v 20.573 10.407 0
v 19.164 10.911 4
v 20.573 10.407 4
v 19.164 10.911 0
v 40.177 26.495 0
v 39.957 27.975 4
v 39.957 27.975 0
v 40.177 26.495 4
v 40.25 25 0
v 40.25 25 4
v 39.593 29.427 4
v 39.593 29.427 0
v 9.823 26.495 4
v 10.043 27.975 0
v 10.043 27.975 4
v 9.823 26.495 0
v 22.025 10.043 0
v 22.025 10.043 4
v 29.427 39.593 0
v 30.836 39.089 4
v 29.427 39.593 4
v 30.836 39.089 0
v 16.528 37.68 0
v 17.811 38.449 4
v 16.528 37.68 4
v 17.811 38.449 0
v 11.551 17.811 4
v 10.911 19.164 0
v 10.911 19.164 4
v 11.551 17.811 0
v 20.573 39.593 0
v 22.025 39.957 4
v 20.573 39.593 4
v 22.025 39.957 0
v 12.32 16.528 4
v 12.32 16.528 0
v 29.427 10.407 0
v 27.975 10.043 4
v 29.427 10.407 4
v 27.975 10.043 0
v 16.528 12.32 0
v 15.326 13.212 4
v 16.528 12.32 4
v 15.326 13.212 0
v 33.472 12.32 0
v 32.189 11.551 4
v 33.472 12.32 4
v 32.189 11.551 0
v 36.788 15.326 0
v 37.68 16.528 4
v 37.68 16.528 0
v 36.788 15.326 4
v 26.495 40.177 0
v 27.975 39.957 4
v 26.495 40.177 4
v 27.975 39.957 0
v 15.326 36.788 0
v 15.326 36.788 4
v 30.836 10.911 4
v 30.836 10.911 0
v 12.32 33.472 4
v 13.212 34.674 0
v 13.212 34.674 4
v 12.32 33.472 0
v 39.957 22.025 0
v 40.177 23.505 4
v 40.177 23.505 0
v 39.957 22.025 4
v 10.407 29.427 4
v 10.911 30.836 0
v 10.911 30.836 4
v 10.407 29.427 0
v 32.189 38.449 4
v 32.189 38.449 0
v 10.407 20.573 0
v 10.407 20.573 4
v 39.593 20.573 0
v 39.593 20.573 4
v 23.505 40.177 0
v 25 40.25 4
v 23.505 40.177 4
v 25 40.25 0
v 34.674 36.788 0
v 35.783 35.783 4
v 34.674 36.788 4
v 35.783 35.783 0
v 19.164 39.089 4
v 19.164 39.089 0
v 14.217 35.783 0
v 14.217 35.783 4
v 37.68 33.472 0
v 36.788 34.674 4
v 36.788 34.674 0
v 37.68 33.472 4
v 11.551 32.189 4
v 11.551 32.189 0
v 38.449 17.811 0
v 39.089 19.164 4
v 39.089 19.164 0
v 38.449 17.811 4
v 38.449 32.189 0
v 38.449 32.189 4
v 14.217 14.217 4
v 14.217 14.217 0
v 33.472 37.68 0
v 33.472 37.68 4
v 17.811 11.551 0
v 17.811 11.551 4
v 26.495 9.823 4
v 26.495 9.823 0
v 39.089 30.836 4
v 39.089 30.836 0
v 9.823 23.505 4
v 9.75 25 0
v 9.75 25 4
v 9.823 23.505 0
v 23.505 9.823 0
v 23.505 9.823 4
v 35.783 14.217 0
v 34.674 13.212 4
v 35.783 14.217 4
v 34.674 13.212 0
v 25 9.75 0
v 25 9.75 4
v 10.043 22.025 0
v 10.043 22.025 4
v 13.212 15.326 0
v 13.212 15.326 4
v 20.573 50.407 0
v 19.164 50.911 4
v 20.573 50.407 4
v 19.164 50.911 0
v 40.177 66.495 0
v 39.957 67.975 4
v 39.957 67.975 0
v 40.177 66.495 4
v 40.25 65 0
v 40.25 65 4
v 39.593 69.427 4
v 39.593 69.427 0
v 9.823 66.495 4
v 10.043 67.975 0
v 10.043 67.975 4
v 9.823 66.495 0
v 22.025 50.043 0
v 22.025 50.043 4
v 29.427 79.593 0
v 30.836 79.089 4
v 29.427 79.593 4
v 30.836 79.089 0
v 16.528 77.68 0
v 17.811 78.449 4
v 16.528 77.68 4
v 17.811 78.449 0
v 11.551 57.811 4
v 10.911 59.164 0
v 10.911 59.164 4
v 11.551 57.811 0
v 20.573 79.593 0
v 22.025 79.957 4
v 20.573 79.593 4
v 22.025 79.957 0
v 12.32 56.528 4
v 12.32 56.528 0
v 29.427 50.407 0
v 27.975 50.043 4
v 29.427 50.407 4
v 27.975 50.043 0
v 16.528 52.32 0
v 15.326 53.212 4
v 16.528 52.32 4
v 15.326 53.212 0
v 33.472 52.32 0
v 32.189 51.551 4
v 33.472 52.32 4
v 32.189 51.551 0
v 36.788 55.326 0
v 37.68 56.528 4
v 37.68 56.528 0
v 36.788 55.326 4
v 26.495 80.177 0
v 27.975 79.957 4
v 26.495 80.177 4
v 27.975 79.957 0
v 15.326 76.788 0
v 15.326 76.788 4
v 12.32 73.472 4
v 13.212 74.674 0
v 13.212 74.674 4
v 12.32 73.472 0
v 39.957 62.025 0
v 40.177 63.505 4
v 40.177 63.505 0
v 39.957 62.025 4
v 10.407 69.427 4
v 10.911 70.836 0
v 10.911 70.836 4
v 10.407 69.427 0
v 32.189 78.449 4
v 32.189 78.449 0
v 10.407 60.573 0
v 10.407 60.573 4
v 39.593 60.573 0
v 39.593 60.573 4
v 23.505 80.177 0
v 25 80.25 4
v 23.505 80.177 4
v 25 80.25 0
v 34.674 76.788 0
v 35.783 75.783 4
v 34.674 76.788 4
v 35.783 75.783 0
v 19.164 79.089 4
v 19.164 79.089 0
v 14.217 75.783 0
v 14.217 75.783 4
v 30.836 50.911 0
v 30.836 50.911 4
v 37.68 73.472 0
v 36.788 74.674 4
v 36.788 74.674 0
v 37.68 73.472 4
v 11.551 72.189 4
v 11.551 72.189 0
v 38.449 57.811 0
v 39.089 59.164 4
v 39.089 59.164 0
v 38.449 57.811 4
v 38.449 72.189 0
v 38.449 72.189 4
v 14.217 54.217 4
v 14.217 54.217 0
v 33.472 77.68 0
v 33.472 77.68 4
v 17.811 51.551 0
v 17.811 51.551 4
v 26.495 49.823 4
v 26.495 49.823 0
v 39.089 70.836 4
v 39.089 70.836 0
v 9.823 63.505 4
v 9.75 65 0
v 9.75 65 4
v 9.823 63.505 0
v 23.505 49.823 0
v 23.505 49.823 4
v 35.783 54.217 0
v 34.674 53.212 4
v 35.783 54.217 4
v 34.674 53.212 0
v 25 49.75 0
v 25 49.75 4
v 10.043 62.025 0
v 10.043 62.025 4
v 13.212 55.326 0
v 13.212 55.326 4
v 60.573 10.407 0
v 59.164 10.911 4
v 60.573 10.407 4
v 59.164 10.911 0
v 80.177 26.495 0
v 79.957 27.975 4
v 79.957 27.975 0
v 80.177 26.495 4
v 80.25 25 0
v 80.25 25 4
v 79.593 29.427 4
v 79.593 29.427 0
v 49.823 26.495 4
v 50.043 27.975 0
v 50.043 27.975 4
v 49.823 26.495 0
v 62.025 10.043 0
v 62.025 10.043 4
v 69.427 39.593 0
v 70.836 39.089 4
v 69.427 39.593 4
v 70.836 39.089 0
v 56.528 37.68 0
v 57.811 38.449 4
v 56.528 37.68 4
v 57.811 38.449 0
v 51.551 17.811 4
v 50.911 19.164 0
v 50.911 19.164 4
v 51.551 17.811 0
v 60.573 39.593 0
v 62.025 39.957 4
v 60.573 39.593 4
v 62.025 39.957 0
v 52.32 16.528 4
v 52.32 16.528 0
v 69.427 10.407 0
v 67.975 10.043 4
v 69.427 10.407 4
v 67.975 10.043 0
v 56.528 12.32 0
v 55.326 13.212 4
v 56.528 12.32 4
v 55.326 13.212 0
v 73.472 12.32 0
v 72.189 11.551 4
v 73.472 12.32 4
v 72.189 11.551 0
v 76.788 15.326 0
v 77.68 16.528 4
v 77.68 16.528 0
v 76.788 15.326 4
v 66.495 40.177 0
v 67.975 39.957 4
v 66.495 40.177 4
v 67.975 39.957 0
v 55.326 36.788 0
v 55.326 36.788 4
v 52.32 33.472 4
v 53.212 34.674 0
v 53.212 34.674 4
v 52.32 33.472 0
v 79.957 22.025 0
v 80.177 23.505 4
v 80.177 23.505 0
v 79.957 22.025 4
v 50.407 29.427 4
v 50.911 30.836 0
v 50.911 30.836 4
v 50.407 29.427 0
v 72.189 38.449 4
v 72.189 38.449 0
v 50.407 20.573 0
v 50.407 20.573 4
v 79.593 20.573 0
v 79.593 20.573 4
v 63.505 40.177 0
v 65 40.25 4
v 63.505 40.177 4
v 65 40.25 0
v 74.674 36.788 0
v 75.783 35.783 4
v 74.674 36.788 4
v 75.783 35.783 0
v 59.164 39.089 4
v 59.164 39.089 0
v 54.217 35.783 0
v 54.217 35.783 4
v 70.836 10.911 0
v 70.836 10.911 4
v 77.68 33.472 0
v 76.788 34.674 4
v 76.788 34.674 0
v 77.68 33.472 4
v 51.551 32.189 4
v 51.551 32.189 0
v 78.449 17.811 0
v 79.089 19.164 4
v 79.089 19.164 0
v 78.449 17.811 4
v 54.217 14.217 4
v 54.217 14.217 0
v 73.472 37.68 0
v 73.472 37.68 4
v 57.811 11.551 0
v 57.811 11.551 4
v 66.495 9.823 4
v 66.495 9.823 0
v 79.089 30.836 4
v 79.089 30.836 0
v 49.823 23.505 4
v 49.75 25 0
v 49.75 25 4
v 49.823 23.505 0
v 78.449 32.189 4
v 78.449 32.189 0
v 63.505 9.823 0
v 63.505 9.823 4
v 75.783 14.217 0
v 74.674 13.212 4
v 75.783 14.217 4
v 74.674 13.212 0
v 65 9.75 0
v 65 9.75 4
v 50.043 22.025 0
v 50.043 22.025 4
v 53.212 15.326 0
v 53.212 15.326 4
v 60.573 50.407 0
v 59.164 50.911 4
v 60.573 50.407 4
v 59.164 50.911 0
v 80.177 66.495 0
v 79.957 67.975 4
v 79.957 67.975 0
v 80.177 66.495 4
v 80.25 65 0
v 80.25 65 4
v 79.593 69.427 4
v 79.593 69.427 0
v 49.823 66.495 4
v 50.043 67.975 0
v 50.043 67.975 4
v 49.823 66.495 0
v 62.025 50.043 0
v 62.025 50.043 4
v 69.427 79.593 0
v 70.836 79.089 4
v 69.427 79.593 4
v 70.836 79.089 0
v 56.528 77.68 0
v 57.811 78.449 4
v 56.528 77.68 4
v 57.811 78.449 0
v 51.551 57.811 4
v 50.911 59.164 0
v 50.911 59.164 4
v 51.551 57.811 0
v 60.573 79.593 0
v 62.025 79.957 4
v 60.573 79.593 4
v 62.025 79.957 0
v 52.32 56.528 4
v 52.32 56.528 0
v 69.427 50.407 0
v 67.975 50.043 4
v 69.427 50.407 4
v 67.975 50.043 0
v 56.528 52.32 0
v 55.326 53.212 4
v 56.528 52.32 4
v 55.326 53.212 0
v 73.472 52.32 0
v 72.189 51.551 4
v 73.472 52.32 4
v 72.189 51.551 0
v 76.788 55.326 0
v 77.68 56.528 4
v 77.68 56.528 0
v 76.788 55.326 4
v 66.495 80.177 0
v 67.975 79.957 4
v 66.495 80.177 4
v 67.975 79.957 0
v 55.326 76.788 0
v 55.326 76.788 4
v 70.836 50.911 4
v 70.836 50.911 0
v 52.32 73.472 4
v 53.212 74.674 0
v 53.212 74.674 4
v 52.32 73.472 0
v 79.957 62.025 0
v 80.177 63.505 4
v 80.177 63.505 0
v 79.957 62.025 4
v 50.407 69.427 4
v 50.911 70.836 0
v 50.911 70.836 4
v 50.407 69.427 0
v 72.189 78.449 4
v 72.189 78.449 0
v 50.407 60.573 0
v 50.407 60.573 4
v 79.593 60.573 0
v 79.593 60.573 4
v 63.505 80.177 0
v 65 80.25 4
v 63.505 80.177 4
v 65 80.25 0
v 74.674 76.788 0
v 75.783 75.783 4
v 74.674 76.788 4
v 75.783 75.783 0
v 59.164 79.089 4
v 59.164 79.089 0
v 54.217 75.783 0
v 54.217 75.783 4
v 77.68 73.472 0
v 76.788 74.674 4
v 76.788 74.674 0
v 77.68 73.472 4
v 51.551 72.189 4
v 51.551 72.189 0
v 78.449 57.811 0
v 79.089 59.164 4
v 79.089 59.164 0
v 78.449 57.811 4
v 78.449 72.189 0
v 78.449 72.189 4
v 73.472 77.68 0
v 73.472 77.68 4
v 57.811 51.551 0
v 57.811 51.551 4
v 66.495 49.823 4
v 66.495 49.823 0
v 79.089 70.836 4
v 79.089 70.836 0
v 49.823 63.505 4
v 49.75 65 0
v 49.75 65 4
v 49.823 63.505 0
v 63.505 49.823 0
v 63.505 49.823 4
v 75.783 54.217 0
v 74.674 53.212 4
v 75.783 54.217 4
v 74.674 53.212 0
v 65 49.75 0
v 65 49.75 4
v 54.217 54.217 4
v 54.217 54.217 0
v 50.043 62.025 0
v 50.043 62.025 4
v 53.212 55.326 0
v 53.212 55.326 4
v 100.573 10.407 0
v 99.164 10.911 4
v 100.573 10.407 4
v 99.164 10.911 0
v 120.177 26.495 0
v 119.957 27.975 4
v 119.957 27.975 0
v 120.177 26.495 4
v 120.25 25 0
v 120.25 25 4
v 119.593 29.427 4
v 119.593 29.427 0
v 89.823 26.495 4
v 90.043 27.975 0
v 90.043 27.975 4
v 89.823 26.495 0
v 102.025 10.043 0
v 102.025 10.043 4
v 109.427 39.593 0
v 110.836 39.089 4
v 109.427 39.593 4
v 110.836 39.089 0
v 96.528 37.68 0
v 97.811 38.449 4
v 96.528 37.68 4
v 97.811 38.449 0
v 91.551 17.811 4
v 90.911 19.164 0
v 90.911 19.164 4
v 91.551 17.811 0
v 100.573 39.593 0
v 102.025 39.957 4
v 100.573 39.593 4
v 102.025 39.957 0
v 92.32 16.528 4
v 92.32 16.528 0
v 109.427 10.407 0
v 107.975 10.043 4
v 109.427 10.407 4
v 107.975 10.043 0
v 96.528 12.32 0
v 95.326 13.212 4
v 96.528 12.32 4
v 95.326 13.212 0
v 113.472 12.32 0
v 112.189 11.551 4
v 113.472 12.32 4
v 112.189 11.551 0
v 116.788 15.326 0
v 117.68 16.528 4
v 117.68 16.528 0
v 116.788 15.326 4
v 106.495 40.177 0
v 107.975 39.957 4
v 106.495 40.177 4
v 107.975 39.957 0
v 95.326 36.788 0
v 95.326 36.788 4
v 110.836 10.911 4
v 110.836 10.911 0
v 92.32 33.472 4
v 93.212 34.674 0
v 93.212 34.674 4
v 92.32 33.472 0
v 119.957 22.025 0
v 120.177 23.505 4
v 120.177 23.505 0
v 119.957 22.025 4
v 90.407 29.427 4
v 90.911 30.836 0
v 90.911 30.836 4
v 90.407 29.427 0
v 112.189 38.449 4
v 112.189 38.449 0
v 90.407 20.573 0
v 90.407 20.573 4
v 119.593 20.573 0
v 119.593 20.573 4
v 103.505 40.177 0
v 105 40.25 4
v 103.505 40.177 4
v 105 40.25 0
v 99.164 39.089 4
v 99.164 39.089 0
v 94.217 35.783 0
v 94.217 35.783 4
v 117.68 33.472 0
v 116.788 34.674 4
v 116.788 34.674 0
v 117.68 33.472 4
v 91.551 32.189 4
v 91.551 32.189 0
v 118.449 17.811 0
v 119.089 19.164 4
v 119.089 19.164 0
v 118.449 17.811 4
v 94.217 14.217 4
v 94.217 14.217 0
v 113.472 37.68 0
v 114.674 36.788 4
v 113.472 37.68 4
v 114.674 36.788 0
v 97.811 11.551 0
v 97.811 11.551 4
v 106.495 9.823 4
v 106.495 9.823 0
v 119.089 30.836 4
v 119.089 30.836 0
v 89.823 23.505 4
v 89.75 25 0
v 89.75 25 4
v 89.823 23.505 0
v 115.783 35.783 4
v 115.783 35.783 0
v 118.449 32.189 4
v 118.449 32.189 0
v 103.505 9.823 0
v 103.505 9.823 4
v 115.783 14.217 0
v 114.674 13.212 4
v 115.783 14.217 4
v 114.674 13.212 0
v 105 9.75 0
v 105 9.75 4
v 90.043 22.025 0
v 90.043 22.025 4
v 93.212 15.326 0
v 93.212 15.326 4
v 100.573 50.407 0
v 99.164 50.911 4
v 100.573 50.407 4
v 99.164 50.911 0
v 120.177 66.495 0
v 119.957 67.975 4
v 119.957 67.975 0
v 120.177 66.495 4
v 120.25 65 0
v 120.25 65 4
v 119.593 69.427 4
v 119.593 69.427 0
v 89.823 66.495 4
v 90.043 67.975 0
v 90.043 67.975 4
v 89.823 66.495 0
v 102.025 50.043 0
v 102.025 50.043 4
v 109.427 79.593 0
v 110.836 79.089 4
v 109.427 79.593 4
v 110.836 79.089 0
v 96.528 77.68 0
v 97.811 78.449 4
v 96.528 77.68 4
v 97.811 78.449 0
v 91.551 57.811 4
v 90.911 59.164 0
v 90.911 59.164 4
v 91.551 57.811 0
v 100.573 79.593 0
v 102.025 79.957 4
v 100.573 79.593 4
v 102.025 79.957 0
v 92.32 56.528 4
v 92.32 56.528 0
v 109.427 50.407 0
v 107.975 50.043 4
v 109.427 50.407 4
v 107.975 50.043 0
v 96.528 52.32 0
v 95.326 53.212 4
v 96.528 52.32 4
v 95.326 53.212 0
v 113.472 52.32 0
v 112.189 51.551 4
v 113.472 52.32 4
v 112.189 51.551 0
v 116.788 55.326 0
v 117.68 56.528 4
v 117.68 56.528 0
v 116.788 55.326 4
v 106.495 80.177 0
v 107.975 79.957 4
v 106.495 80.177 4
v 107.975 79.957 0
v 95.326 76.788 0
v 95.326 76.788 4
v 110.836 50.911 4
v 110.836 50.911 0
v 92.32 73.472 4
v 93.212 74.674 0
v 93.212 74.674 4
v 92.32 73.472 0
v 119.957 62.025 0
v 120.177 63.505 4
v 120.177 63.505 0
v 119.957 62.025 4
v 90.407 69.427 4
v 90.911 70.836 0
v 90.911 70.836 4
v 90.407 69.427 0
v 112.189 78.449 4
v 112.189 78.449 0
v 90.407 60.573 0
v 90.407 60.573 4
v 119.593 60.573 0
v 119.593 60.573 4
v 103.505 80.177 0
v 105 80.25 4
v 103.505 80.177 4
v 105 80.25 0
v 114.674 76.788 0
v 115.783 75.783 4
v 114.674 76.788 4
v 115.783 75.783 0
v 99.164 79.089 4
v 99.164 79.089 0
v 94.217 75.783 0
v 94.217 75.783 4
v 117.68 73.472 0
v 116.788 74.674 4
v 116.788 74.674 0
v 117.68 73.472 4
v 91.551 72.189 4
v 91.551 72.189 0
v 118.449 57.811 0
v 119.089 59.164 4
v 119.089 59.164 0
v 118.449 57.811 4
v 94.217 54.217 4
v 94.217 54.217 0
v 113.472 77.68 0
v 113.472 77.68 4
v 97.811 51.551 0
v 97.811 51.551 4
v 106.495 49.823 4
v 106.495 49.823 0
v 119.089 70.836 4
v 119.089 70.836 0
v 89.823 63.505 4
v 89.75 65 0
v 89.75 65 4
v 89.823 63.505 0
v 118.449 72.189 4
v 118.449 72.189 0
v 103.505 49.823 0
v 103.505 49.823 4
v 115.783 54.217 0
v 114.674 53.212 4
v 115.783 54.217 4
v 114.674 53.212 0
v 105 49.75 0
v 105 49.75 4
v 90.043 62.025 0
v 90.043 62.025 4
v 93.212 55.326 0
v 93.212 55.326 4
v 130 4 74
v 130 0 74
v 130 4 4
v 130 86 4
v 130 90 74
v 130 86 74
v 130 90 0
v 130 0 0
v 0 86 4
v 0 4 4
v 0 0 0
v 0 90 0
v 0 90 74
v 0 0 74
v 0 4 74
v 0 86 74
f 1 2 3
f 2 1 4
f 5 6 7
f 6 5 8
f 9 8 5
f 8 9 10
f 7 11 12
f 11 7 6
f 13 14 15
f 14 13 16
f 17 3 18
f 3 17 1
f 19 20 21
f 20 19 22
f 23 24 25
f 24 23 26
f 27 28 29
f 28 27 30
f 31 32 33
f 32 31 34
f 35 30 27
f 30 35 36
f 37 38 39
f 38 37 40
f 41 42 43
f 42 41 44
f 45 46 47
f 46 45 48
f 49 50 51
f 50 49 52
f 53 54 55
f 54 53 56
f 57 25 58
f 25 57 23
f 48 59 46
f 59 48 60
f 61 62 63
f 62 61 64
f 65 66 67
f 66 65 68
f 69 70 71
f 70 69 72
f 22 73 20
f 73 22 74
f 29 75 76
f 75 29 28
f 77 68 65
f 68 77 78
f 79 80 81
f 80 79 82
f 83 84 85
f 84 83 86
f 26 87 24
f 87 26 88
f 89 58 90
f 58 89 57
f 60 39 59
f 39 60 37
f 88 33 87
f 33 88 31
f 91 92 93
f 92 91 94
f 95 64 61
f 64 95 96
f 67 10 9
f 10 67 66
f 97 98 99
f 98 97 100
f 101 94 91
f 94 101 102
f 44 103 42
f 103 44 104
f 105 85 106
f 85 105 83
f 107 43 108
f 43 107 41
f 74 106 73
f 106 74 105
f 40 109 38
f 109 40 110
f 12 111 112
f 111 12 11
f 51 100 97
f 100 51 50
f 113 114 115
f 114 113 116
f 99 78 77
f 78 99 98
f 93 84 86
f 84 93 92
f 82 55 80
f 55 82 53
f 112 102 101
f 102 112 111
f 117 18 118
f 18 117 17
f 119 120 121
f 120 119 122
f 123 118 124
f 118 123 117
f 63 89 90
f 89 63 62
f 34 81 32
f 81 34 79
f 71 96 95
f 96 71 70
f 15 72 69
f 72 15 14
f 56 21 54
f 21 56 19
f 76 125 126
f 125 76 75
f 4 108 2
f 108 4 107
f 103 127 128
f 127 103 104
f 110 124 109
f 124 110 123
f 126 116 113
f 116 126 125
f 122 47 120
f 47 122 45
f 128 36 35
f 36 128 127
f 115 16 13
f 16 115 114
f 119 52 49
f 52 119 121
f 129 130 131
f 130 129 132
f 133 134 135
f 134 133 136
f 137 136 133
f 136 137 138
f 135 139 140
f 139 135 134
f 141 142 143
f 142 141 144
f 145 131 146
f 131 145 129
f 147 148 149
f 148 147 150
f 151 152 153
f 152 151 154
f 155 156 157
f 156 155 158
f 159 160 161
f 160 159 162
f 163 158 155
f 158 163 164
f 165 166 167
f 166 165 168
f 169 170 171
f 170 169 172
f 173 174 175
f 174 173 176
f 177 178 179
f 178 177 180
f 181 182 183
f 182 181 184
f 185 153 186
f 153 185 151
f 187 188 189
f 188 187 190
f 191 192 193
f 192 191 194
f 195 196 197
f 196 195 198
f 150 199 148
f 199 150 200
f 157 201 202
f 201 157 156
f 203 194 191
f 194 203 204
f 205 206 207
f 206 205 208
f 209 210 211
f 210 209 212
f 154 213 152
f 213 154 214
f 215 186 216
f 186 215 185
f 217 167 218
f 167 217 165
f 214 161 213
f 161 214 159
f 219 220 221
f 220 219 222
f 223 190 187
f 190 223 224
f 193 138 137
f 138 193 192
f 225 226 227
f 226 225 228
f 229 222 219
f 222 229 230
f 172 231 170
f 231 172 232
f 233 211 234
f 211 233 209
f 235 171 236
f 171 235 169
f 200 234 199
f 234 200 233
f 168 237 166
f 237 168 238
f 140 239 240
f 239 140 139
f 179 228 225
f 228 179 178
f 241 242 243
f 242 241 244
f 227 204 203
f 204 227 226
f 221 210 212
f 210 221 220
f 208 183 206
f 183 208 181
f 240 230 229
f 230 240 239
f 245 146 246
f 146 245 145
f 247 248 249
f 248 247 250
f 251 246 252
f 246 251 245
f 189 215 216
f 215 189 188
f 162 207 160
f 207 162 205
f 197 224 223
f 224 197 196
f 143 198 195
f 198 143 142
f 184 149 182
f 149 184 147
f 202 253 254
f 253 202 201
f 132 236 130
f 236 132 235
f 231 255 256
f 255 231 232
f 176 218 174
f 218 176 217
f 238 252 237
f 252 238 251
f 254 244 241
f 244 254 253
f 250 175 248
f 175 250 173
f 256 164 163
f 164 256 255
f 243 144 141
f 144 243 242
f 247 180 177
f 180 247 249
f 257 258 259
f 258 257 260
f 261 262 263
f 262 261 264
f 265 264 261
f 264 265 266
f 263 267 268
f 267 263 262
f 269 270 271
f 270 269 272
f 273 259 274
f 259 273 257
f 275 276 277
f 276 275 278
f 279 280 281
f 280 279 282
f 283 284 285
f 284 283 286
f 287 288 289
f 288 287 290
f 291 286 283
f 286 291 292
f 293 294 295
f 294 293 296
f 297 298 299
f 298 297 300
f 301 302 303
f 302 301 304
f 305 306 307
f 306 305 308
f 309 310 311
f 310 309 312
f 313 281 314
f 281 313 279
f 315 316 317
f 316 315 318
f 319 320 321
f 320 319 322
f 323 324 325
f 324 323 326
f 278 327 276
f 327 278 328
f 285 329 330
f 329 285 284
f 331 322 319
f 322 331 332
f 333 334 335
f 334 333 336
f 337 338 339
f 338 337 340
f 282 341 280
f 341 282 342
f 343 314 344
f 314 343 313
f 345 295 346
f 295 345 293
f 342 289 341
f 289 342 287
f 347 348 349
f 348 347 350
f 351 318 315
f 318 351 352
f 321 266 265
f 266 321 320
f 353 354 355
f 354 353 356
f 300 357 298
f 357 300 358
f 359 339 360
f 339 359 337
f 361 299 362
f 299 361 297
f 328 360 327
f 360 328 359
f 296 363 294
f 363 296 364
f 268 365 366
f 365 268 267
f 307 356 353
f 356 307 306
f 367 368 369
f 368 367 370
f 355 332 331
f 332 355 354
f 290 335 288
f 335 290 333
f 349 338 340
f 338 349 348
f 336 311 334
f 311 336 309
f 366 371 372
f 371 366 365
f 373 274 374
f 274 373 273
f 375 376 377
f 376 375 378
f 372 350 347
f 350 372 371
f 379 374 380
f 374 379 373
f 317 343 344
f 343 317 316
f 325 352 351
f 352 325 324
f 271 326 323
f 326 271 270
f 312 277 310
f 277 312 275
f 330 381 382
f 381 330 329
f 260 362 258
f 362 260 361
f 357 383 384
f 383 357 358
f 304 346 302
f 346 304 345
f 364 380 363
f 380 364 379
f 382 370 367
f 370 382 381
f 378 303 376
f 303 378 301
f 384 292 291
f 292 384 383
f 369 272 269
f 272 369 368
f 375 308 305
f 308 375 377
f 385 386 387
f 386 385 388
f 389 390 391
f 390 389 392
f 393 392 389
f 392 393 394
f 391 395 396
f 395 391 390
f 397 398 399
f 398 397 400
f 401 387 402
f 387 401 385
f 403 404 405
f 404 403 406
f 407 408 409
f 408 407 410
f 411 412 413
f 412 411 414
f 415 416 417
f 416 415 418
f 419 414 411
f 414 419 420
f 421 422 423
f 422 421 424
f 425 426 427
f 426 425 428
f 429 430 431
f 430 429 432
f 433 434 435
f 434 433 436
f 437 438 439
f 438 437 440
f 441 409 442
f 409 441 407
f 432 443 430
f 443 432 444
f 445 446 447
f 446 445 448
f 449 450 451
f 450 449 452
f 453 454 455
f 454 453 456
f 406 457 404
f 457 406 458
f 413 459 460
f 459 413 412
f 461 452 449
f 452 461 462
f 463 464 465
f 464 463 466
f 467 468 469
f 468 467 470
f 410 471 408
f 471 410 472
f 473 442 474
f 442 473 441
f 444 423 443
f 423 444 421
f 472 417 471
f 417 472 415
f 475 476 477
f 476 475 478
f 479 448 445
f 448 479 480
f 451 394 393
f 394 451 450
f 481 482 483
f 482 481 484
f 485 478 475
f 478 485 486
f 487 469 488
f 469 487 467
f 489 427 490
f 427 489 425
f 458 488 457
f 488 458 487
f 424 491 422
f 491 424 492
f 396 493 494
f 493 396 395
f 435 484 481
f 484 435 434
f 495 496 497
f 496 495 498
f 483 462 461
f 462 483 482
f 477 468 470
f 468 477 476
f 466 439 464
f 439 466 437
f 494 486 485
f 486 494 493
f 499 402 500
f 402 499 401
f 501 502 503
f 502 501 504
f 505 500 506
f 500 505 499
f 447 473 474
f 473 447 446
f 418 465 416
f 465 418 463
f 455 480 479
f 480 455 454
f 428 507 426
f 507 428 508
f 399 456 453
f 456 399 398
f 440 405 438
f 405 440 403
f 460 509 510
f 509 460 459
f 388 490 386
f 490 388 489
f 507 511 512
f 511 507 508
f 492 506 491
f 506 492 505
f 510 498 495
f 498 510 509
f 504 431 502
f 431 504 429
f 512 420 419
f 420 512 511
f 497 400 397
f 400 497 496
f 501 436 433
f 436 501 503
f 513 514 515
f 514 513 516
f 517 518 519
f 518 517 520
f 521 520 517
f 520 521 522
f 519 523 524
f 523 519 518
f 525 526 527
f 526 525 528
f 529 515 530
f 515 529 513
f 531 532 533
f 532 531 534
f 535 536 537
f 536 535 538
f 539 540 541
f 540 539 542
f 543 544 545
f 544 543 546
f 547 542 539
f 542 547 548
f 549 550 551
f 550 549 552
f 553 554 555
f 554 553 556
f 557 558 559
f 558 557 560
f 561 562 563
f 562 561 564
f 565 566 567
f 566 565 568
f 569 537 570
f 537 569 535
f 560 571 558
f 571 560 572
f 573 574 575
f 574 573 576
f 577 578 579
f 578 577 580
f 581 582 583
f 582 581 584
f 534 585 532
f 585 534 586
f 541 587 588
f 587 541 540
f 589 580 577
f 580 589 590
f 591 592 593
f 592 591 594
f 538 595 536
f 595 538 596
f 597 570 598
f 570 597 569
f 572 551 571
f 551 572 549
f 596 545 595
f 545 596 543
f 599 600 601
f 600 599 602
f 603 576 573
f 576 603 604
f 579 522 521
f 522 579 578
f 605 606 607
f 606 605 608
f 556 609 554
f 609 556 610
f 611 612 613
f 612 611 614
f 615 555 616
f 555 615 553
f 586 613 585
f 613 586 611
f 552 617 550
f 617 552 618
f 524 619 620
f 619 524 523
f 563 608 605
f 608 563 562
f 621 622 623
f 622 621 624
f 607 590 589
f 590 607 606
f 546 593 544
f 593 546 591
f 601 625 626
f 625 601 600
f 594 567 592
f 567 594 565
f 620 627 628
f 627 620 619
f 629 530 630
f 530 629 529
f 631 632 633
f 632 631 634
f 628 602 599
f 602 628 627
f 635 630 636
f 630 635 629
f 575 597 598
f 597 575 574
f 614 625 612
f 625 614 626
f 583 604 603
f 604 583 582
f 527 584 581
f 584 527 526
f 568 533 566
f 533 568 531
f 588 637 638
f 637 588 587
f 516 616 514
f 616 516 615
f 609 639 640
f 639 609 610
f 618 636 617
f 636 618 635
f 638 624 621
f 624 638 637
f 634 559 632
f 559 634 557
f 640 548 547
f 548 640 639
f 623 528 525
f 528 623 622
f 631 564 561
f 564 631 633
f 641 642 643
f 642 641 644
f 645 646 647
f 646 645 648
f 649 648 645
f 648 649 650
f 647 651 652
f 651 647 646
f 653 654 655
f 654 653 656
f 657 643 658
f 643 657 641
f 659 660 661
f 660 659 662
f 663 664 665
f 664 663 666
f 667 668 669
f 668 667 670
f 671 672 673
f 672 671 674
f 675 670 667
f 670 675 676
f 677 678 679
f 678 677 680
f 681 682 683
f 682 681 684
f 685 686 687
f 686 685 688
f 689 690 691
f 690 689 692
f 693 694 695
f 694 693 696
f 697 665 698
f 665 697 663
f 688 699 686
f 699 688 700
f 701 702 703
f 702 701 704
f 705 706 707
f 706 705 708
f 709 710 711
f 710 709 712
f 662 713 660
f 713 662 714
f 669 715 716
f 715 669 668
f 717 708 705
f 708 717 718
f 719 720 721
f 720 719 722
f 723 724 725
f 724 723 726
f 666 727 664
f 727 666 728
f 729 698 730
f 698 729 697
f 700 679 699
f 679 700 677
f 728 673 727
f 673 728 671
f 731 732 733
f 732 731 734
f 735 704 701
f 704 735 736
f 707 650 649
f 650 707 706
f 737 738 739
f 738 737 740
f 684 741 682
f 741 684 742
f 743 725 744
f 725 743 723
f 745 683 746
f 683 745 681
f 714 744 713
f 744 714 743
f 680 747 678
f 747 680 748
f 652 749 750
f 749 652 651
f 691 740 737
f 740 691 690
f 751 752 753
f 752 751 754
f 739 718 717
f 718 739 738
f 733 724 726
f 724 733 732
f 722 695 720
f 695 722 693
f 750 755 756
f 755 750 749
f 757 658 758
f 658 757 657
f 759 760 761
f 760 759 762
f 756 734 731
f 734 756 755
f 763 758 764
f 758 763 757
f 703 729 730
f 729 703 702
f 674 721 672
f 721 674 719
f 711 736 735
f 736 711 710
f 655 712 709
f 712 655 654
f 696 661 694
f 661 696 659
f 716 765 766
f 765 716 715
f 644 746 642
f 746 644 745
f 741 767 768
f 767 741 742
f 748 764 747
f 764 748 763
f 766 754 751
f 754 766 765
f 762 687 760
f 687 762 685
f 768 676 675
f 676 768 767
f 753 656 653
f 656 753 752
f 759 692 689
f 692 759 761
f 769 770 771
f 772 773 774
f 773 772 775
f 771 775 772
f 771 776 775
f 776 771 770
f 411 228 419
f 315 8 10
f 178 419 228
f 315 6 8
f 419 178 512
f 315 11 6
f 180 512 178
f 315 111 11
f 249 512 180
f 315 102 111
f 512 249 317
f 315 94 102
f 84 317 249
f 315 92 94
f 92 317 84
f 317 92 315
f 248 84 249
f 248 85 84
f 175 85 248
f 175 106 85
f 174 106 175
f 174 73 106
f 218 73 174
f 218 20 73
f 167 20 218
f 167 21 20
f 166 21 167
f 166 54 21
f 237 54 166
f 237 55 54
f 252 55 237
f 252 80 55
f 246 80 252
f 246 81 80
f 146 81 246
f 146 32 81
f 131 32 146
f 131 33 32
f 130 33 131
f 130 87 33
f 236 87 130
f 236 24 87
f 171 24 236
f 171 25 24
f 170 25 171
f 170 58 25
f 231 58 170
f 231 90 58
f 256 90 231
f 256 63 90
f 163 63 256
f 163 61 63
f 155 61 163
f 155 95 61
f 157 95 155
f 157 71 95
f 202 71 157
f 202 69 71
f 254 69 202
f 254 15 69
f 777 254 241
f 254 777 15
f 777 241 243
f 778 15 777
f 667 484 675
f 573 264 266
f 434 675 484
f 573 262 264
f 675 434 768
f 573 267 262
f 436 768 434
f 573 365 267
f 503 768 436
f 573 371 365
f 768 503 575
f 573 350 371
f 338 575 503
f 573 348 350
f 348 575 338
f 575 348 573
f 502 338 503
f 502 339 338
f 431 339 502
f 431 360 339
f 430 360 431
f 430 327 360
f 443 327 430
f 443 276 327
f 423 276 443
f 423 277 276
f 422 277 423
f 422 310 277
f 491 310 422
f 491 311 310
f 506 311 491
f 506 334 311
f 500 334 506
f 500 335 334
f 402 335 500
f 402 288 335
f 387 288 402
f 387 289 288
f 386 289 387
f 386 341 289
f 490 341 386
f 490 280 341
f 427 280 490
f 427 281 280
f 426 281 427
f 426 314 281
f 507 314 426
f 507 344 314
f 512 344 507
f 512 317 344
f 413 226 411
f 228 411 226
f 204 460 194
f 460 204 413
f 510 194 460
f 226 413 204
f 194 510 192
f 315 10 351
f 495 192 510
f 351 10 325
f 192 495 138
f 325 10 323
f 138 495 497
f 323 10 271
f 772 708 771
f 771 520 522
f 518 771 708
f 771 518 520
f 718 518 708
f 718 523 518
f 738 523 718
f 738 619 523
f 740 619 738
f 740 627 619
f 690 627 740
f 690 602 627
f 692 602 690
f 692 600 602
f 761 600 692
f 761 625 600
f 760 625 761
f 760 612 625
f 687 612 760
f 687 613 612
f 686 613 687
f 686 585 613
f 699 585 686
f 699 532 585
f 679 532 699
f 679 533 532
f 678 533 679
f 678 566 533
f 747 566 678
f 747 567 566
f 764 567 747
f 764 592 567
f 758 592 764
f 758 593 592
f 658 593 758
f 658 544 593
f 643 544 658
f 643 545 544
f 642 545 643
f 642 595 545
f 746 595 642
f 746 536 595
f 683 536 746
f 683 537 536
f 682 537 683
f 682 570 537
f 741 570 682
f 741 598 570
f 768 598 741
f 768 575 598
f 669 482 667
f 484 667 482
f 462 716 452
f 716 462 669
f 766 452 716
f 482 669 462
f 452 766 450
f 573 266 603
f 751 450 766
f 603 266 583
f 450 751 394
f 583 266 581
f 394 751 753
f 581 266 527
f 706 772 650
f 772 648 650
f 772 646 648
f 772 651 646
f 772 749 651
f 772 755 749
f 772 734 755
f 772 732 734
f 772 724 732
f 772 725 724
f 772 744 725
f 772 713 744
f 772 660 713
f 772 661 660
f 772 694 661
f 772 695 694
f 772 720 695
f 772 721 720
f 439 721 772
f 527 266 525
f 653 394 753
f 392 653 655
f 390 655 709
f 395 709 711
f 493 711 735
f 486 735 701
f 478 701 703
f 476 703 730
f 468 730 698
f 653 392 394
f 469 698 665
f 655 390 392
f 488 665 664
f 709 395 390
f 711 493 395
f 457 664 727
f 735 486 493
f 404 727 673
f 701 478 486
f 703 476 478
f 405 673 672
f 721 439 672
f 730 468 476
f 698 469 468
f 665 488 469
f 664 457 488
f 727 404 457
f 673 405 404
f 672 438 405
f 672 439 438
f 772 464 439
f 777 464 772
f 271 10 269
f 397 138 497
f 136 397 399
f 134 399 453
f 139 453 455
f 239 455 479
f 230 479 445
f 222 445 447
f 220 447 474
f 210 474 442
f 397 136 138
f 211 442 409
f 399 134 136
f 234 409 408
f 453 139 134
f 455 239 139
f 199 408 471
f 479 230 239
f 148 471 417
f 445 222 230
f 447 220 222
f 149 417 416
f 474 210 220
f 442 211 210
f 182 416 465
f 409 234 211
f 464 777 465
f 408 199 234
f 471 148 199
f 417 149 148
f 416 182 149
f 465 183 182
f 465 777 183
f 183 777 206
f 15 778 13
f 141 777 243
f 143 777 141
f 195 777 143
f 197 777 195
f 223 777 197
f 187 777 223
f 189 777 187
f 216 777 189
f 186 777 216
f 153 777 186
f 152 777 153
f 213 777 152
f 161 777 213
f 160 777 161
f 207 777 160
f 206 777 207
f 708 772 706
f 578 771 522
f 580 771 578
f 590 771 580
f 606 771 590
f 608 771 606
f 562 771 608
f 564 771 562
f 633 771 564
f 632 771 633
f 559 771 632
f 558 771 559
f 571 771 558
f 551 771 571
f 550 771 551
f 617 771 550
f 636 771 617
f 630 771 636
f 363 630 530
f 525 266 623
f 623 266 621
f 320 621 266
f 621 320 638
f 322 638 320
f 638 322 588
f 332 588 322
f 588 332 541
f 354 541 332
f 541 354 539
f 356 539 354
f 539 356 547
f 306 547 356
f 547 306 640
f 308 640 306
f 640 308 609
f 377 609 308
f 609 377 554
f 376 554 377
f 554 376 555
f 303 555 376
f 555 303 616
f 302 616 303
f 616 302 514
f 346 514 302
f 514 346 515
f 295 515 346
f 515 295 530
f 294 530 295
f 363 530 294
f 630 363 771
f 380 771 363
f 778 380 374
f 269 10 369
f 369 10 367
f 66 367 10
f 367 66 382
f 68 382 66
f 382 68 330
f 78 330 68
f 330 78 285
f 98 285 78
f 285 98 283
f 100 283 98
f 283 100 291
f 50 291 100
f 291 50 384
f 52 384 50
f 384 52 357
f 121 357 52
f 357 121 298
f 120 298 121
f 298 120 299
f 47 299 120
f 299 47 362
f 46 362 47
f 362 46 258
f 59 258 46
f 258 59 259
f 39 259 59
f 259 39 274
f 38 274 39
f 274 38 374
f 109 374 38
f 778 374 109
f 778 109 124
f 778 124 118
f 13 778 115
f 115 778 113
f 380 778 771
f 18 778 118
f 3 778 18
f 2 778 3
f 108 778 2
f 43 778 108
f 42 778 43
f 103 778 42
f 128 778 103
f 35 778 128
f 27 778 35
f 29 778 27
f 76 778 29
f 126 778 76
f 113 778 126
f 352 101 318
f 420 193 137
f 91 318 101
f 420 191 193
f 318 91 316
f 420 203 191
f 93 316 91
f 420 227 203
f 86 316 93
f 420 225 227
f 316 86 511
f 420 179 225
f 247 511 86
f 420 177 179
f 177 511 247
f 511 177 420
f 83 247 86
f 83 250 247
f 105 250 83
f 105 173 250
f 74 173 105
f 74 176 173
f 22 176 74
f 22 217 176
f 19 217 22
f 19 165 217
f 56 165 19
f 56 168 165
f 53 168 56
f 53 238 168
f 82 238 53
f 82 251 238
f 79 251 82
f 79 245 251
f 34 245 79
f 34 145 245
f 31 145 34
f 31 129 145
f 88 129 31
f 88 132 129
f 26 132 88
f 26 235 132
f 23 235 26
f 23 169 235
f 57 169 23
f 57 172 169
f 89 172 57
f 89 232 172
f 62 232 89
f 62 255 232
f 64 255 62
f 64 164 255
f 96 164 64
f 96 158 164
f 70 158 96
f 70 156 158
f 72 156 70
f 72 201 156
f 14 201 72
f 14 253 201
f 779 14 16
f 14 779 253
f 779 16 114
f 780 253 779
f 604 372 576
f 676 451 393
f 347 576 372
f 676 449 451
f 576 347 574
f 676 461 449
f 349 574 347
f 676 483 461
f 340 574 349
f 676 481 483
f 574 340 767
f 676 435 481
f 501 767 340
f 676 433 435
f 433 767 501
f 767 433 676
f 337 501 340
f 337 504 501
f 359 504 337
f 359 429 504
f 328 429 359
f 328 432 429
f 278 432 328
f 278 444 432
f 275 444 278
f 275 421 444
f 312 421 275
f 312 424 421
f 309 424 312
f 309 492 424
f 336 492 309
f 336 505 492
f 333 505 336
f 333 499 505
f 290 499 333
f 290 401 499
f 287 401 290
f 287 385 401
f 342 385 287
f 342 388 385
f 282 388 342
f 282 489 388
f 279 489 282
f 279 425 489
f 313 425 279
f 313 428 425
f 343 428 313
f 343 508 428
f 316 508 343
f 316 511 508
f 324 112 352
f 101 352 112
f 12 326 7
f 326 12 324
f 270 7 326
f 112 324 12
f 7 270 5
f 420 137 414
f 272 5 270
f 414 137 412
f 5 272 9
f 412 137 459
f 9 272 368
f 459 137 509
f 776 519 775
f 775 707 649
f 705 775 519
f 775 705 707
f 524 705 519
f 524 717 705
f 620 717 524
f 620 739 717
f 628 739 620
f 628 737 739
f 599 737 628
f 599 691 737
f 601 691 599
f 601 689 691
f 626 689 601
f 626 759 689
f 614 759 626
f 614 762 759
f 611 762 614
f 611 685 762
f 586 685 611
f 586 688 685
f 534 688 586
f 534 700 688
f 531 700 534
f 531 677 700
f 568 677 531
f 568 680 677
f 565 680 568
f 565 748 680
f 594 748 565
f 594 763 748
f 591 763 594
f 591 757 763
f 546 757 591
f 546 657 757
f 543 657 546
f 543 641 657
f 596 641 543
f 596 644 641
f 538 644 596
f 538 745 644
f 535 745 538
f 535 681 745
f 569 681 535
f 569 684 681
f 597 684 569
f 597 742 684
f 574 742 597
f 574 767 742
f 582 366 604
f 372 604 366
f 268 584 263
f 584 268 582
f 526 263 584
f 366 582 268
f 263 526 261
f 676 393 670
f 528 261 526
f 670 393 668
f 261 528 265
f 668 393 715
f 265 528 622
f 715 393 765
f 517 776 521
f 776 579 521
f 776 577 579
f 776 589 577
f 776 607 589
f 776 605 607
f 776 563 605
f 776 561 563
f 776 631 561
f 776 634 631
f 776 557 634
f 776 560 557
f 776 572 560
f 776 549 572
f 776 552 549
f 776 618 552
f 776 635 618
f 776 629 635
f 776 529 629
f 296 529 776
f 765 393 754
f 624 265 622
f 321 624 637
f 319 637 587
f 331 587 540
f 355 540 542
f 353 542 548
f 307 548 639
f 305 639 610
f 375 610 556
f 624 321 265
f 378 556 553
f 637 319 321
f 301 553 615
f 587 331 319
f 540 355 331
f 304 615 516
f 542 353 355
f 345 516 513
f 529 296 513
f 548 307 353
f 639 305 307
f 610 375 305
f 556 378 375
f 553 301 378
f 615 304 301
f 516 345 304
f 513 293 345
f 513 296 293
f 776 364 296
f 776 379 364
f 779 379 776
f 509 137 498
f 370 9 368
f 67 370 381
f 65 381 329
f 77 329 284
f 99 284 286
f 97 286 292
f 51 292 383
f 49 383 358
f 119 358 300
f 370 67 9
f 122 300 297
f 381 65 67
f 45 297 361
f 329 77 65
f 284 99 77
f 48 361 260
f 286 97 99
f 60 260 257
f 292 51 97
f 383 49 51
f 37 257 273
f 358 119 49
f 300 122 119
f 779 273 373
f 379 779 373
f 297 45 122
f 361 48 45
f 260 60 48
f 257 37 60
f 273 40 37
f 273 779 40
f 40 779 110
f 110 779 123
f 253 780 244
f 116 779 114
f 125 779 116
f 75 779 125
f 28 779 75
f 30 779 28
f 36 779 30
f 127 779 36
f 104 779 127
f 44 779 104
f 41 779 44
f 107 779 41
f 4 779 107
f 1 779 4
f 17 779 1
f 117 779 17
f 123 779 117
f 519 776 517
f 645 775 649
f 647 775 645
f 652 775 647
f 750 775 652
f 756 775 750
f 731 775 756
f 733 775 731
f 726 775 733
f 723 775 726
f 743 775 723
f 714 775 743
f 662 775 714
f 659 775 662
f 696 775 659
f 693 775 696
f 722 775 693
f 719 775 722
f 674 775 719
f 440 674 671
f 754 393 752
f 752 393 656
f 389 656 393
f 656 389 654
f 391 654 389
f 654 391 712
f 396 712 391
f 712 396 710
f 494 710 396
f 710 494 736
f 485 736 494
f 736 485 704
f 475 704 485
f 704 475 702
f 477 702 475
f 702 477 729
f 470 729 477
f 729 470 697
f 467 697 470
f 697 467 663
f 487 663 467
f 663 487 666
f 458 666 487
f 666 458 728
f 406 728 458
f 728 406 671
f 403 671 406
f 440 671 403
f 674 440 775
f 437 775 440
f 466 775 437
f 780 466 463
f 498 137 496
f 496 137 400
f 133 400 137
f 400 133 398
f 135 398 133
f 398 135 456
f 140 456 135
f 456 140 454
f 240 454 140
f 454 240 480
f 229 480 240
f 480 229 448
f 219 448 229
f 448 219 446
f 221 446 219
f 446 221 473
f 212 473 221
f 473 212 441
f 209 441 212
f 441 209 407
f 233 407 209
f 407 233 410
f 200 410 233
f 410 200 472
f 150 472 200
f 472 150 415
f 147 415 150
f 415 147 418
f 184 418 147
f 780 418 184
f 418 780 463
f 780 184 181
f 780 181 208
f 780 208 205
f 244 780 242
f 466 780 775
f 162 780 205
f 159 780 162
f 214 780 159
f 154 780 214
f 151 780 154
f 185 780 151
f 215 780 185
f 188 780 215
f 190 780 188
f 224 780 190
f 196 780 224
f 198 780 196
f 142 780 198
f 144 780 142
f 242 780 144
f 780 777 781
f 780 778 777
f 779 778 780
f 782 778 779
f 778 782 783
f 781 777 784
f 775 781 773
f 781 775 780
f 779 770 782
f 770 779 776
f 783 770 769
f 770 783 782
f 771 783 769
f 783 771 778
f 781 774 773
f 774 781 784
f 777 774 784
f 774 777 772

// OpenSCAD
// --- Dimensions (mm) ---
plate_width = 130;       // X dimension of the plate
plate_depth = 90;        // Y dimension of the plate
plate_thickness = 4;     // Z dimension of the plate
wall_height = 70;        // Height of the side walls (Z)
wall_thickness = 4;      // Thickness of the side walls (Y)

hole_diameter = 30.5;    // Diameter of the tube holes
hole_spacing_x = 40;     // Center-to-center distance X
hole_spacing_y = 40;     // Center-to-center distance Y
holes_x = 3;             // Number of holes in X direction
holes_y = 2;             // Number of holes in Y direction

// --- Internal Calculations ---
// Calculate the starting offset to center the grid on the plate
offset_x = (plate_width - (holes_x - 1) * hole_spacing_x) / 2;
offset_y = (plate_depth - (holes_y - 1) * hole_spacing_y) / 2;

// Resolution
$fn = 64;

// --- Modeling ---
// The part is built such that the plate is at Z=0 to 4.
// The walls rise from the plate to Z=74 (4 + 70).
// The user specifies the part is printed "upside down" and then flipped.
// This implies the walls are the part that will be "on the bed" 
// in the print orientation to avoid supports and ensure a flat top.
// However, the prompt explicitly defines the print orientation:
// "In print orientation: a flat plate 130 mm (X) by 90 mm (Y) and 4 mm thick lies on the bed (z = 0 to 4)."
// Therefore, we model exactly as described.

union() {
    // 1. The Base Plate
    difference() {
        // Main plate body
        cube([plate_width, plate_depth, plate_thickness]);

        // 2. The Six Holes
        // We use a nested loop to create the 3x2 grid
        for (i = [0 : holes_x - 1]) {
            for (j = [0 : holes_y - 1]) {
                translate(
                    [offset_x + i * hole_spacing_x, 
                     offset_y + j * hole_spacing_y, 
                     -1] // Extend slightly below plate to ensure clean cut
                )
                cylinder(h = plate_thickness + 2, d = hole_diameter);
            }
        }
    }

    // 3. The Two Side Walls
    // Walls are flush with the long edges (X-axis edges)
    // Long edges are at Y = 0 and Y = plate_depth
    
    // Wall 1 (at Y = 0)
    // Occupies Y from 0 to 4.
    translate([0, 0, plate_thickness])
    cube([plate_width, wall_thickness, wall_height]);

    // Wall 2 (at Y = plate_depth - wall_thickness)
    // Occupies Y from 86 to 90.
    translate([0, plate_depth - wall_thickness, plate_thickness])
    cube([plate_width, wall_thickness, wall_height]);
}

// --- Final Verification against Specification ---
// Plate: 130 (X) x 90 (Y) x 4 (Z) -> Matches.
// Holes: 6 holes, 30.5mm dia, 40mm spacing, 2 rows of 3 -> Matches.
// Walls: 130 (X) x 4 (Y) x 70 (Z) height from plate -> Matches.
// Walls are flush with long edges (Y=0 and Y=90) -> Matches.
// Total Z height: 4 (plate) + 70 (wall) = 74mm -> Matches.
